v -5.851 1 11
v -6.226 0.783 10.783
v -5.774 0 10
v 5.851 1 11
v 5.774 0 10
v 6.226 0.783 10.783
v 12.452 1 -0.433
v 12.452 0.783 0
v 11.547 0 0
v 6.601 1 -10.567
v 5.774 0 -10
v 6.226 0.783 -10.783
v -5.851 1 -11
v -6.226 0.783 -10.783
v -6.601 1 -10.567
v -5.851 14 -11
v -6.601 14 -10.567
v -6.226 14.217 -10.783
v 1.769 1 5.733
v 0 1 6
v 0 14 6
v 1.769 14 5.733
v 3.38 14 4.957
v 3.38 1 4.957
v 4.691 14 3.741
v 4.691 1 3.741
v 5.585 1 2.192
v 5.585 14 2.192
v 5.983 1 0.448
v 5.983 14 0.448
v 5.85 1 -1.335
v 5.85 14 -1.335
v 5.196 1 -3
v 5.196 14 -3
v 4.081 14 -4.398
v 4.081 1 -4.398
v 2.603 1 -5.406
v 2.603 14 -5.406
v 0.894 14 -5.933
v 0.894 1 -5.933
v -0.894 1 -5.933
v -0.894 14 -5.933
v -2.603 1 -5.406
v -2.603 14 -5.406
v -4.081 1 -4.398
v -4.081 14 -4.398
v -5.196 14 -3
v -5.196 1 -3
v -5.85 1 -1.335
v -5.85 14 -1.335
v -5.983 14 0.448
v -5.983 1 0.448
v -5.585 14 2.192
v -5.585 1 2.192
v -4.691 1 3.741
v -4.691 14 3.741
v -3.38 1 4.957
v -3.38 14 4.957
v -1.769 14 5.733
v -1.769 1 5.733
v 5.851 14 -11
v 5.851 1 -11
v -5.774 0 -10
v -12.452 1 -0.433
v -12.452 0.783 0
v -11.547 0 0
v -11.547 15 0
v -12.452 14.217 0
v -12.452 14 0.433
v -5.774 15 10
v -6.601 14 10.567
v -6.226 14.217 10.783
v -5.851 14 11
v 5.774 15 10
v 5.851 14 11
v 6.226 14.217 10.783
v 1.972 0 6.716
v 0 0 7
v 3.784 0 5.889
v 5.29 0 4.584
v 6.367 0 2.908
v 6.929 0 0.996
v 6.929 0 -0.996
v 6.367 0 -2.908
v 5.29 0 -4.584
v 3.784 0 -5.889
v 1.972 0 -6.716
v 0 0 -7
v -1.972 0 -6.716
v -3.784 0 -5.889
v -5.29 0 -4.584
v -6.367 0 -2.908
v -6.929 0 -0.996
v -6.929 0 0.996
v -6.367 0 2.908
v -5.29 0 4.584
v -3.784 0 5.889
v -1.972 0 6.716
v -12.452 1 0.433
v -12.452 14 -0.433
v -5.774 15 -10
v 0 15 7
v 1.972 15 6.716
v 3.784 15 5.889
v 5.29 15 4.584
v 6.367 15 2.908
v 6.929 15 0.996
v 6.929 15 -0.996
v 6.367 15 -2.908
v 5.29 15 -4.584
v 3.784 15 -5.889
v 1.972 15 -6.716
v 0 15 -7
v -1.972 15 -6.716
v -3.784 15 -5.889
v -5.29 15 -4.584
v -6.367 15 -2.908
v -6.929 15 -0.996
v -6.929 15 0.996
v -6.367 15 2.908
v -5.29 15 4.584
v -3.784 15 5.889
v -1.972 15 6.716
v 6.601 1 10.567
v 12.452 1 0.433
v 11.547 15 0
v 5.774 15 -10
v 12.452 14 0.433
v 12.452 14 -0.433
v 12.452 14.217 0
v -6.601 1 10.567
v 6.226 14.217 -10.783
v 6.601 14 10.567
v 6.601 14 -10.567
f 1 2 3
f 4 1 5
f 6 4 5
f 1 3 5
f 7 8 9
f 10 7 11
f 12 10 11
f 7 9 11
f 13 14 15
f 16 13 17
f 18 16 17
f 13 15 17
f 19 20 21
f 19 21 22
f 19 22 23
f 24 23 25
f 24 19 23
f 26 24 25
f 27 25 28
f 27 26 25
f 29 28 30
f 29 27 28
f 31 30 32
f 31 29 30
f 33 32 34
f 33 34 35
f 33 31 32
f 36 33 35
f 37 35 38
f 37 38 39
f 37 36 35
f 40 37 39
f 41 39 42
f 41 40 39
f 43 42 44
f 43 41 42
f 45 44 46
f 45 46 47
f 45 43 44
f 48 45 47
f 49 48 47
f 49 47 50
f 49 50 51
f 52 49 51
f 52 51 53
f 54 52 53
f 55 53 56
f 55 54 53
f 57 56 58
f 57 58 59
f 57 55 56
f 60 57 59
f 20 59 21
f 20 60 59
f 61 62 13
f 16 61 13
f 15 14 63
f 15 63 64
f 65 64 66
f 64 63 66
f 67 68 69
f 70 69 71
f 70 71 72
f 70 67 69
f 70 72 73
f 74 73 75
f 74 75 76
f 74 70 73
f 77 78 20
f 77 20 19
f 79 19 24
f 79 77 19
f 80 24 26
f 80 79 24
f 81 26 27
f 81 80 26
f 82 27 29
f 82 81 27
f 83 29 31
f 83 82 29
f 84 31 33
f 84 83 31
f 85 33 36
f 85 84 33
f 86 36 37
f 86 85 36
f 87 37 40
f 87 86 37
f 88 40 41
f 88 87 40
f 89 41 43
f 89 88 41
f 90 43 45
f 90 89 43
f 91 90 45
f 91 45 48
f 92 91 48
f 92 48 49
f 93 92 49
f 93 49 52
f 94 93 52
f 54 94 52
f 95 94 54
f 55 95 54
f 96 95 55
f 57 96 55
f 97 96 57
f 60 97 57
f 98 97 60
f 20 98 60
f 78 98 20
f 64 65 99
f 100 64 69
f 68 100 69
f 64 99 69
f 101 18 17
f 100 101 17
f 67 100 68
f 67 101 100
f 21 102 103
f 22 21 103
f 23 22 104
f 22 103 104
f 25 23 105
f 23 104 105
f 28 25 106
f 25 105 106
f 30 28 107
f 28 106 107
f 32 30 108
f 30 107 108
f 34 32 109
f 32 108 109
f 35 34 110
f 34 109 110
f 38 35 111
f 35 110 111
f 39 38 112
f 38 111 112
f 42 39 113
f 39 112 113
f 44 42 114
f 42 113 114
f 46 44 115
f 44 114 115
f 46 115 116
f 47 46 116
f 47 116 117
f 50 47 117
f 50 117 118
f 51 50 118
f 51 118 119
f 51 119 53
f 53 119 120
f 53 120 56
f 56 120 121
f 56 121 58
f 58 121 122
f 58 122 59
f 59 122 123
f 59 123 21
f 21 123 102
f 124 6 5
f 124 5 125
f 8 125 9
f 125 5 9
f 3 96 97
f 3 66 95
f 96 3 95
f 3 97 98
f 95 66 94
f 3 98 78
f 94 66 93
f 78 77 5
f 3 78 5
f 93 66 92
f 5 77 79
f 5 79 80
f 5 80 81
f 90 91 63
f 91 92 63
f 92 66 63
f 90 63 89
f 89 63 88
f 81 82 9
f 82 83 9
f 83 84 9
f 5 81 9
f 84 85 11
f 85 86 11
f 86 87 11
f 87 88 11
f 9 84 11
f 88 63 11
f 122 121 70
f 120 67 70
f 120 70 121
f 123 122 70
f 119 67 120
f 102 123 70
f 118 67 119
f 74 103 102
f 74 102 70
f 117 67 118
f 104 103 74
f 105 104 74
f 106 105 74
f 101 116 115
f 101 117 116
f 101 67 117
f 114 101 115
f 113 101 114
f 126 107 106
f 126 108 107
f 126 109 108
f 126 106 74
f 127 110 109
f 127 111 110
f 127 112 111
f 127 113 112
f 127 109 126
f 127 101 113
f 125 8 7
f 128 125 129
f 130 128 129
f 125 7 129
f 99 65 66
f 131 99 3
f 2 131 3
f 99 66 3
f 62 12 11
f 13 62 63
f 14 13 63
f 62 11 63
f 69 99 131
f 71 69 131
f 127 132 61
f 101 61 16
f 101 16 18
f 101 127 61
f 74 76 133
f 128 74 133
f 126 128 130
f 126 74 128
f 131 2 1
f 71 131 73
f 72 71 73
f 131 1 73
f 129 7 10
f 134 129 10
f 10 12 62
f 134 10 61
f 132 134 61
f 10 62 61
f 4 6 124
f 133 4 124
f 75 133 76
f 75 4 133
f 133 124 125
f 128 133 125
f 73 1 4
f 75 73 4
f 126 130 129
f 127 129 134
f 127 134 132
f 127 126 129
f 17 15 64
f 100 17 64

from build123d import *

# Parameters (mm, degrees)
SKETCH1_R           = 6
EXTRUDE1_DEPTH      = 15
SMUSSO2_SIZE        = 1
SMUSSO3_SIZE        = 0.5
SMUSSO3_EDGE_2_SIZE = 0.5
SMUSSO3_EDGE_3_SIZE = 0.5
SMUSSO3_EDGE_4_SIZE = 0.5
SMUSSO3_EDGE_5_SIZE = 0.5
SMUSSO3_EDGE_6_SIZE = 0.5


with BuildPart() as part:
    # Sketch1 → Extrude1 (new body)
    with BuildSketch(Plane(origin=(0, 0, 0), x_dir=(1, 0, 0), z_dir=(0, 1, 0))):
        Polygon((6.350852961, -11), (12.701705922, 0), (6.350852961, 11), (-6.350852961, 11), (-12.701705922, 0), (-6.350852961, -11), align=None)
        with Locations(Location((0, 0, 0), (0, 0, 270))):
            Circle(SKETCH1_R, mode=Mode.SUBTRACT)
    extrude(amount=EXTRUDE1_DEPTH)

    # Smusso2
    smusso2_edges = [part.edges().sort_by_distance(p)[0] for p in [
        (9.526279442, 15, -5.5),
        (0, 15, -11),
        (0, 0, -6),
        (0, 15, -6),
        (-9.526279442, 15, -5.5),
        (-9.526279442, 15, 5.5),
        (0, 15, 11),
        (-9.526279442, 0, 5.5),
        (-9.526279442, 0, -5.5),
        (0, 0, -11),
        (9.526279442, 0, -5.5),
        (9.526279442, 0, 5.5),
        (0, 0, 11),
        (9.526279442, 15, 5.5),
    ]]
    chamfer(smusso2_edges, length=SMUSSO2_SIZE)

    # Smusso3
    smusso3_edges = [part.edges().sort_by_distance(p)[0] for p in [
        (12.701705922, 7.5, 0),
    ]]
    chamfer(smusso3_edges, length=SMUSSO3_SIZE)

    # Smusso3 edge 2
    smusso3_edge_2_edges = [part.edges().sort_by_distance(p)[0] for p in [
        (6.350852961, 7.5, 11),
    ]]
    chamfer(smusso3_edge_2_edges, length=SMUSSO3_EDGE_2_SIZE)

    # Smusso3 edge 3
    smusso3_edge_3_edges = [part.edges().sort_by_distance(p)[0] for p in [
        (6.350852961, 7.5, -11),
    ]]
    chamfer(smusso3_edge_3_edges, length=SMUSSO3_EDGE_3_SIZE)

    # Smusso3 edge 4
    smusso3_edge_4_edges = [part.edges().sort_by_distance(p)[0] for p in [
        (-6.350852961, 7.5, -11),
    ]]
    chamfer(smusso3_edge_4_edges, length=SMUSSO3_EDGE_4_SIZE)

    # Smusso3 edge 5
    smusso3_edge_5_edges = [part.edges().sort_by_distance(p)[0] for p in [
        (-12.701705922, 7.5, 0),
    ]]
    chamfer(smusso3_edge_5_edges, length=SMUSSO3_EDGE_5_SIZE)

    # Smusso3 edge 6
    smusso3_edge_6_edges = [part.edges().sort_by_distance(p)[0] for p in [
        (-6.350852961, 7.5, 11),
    ]]
    chamfer(smusso3_edge_6_edges, length=SMUSSO3_EDGE_6_SIZE)


solid = part.part
